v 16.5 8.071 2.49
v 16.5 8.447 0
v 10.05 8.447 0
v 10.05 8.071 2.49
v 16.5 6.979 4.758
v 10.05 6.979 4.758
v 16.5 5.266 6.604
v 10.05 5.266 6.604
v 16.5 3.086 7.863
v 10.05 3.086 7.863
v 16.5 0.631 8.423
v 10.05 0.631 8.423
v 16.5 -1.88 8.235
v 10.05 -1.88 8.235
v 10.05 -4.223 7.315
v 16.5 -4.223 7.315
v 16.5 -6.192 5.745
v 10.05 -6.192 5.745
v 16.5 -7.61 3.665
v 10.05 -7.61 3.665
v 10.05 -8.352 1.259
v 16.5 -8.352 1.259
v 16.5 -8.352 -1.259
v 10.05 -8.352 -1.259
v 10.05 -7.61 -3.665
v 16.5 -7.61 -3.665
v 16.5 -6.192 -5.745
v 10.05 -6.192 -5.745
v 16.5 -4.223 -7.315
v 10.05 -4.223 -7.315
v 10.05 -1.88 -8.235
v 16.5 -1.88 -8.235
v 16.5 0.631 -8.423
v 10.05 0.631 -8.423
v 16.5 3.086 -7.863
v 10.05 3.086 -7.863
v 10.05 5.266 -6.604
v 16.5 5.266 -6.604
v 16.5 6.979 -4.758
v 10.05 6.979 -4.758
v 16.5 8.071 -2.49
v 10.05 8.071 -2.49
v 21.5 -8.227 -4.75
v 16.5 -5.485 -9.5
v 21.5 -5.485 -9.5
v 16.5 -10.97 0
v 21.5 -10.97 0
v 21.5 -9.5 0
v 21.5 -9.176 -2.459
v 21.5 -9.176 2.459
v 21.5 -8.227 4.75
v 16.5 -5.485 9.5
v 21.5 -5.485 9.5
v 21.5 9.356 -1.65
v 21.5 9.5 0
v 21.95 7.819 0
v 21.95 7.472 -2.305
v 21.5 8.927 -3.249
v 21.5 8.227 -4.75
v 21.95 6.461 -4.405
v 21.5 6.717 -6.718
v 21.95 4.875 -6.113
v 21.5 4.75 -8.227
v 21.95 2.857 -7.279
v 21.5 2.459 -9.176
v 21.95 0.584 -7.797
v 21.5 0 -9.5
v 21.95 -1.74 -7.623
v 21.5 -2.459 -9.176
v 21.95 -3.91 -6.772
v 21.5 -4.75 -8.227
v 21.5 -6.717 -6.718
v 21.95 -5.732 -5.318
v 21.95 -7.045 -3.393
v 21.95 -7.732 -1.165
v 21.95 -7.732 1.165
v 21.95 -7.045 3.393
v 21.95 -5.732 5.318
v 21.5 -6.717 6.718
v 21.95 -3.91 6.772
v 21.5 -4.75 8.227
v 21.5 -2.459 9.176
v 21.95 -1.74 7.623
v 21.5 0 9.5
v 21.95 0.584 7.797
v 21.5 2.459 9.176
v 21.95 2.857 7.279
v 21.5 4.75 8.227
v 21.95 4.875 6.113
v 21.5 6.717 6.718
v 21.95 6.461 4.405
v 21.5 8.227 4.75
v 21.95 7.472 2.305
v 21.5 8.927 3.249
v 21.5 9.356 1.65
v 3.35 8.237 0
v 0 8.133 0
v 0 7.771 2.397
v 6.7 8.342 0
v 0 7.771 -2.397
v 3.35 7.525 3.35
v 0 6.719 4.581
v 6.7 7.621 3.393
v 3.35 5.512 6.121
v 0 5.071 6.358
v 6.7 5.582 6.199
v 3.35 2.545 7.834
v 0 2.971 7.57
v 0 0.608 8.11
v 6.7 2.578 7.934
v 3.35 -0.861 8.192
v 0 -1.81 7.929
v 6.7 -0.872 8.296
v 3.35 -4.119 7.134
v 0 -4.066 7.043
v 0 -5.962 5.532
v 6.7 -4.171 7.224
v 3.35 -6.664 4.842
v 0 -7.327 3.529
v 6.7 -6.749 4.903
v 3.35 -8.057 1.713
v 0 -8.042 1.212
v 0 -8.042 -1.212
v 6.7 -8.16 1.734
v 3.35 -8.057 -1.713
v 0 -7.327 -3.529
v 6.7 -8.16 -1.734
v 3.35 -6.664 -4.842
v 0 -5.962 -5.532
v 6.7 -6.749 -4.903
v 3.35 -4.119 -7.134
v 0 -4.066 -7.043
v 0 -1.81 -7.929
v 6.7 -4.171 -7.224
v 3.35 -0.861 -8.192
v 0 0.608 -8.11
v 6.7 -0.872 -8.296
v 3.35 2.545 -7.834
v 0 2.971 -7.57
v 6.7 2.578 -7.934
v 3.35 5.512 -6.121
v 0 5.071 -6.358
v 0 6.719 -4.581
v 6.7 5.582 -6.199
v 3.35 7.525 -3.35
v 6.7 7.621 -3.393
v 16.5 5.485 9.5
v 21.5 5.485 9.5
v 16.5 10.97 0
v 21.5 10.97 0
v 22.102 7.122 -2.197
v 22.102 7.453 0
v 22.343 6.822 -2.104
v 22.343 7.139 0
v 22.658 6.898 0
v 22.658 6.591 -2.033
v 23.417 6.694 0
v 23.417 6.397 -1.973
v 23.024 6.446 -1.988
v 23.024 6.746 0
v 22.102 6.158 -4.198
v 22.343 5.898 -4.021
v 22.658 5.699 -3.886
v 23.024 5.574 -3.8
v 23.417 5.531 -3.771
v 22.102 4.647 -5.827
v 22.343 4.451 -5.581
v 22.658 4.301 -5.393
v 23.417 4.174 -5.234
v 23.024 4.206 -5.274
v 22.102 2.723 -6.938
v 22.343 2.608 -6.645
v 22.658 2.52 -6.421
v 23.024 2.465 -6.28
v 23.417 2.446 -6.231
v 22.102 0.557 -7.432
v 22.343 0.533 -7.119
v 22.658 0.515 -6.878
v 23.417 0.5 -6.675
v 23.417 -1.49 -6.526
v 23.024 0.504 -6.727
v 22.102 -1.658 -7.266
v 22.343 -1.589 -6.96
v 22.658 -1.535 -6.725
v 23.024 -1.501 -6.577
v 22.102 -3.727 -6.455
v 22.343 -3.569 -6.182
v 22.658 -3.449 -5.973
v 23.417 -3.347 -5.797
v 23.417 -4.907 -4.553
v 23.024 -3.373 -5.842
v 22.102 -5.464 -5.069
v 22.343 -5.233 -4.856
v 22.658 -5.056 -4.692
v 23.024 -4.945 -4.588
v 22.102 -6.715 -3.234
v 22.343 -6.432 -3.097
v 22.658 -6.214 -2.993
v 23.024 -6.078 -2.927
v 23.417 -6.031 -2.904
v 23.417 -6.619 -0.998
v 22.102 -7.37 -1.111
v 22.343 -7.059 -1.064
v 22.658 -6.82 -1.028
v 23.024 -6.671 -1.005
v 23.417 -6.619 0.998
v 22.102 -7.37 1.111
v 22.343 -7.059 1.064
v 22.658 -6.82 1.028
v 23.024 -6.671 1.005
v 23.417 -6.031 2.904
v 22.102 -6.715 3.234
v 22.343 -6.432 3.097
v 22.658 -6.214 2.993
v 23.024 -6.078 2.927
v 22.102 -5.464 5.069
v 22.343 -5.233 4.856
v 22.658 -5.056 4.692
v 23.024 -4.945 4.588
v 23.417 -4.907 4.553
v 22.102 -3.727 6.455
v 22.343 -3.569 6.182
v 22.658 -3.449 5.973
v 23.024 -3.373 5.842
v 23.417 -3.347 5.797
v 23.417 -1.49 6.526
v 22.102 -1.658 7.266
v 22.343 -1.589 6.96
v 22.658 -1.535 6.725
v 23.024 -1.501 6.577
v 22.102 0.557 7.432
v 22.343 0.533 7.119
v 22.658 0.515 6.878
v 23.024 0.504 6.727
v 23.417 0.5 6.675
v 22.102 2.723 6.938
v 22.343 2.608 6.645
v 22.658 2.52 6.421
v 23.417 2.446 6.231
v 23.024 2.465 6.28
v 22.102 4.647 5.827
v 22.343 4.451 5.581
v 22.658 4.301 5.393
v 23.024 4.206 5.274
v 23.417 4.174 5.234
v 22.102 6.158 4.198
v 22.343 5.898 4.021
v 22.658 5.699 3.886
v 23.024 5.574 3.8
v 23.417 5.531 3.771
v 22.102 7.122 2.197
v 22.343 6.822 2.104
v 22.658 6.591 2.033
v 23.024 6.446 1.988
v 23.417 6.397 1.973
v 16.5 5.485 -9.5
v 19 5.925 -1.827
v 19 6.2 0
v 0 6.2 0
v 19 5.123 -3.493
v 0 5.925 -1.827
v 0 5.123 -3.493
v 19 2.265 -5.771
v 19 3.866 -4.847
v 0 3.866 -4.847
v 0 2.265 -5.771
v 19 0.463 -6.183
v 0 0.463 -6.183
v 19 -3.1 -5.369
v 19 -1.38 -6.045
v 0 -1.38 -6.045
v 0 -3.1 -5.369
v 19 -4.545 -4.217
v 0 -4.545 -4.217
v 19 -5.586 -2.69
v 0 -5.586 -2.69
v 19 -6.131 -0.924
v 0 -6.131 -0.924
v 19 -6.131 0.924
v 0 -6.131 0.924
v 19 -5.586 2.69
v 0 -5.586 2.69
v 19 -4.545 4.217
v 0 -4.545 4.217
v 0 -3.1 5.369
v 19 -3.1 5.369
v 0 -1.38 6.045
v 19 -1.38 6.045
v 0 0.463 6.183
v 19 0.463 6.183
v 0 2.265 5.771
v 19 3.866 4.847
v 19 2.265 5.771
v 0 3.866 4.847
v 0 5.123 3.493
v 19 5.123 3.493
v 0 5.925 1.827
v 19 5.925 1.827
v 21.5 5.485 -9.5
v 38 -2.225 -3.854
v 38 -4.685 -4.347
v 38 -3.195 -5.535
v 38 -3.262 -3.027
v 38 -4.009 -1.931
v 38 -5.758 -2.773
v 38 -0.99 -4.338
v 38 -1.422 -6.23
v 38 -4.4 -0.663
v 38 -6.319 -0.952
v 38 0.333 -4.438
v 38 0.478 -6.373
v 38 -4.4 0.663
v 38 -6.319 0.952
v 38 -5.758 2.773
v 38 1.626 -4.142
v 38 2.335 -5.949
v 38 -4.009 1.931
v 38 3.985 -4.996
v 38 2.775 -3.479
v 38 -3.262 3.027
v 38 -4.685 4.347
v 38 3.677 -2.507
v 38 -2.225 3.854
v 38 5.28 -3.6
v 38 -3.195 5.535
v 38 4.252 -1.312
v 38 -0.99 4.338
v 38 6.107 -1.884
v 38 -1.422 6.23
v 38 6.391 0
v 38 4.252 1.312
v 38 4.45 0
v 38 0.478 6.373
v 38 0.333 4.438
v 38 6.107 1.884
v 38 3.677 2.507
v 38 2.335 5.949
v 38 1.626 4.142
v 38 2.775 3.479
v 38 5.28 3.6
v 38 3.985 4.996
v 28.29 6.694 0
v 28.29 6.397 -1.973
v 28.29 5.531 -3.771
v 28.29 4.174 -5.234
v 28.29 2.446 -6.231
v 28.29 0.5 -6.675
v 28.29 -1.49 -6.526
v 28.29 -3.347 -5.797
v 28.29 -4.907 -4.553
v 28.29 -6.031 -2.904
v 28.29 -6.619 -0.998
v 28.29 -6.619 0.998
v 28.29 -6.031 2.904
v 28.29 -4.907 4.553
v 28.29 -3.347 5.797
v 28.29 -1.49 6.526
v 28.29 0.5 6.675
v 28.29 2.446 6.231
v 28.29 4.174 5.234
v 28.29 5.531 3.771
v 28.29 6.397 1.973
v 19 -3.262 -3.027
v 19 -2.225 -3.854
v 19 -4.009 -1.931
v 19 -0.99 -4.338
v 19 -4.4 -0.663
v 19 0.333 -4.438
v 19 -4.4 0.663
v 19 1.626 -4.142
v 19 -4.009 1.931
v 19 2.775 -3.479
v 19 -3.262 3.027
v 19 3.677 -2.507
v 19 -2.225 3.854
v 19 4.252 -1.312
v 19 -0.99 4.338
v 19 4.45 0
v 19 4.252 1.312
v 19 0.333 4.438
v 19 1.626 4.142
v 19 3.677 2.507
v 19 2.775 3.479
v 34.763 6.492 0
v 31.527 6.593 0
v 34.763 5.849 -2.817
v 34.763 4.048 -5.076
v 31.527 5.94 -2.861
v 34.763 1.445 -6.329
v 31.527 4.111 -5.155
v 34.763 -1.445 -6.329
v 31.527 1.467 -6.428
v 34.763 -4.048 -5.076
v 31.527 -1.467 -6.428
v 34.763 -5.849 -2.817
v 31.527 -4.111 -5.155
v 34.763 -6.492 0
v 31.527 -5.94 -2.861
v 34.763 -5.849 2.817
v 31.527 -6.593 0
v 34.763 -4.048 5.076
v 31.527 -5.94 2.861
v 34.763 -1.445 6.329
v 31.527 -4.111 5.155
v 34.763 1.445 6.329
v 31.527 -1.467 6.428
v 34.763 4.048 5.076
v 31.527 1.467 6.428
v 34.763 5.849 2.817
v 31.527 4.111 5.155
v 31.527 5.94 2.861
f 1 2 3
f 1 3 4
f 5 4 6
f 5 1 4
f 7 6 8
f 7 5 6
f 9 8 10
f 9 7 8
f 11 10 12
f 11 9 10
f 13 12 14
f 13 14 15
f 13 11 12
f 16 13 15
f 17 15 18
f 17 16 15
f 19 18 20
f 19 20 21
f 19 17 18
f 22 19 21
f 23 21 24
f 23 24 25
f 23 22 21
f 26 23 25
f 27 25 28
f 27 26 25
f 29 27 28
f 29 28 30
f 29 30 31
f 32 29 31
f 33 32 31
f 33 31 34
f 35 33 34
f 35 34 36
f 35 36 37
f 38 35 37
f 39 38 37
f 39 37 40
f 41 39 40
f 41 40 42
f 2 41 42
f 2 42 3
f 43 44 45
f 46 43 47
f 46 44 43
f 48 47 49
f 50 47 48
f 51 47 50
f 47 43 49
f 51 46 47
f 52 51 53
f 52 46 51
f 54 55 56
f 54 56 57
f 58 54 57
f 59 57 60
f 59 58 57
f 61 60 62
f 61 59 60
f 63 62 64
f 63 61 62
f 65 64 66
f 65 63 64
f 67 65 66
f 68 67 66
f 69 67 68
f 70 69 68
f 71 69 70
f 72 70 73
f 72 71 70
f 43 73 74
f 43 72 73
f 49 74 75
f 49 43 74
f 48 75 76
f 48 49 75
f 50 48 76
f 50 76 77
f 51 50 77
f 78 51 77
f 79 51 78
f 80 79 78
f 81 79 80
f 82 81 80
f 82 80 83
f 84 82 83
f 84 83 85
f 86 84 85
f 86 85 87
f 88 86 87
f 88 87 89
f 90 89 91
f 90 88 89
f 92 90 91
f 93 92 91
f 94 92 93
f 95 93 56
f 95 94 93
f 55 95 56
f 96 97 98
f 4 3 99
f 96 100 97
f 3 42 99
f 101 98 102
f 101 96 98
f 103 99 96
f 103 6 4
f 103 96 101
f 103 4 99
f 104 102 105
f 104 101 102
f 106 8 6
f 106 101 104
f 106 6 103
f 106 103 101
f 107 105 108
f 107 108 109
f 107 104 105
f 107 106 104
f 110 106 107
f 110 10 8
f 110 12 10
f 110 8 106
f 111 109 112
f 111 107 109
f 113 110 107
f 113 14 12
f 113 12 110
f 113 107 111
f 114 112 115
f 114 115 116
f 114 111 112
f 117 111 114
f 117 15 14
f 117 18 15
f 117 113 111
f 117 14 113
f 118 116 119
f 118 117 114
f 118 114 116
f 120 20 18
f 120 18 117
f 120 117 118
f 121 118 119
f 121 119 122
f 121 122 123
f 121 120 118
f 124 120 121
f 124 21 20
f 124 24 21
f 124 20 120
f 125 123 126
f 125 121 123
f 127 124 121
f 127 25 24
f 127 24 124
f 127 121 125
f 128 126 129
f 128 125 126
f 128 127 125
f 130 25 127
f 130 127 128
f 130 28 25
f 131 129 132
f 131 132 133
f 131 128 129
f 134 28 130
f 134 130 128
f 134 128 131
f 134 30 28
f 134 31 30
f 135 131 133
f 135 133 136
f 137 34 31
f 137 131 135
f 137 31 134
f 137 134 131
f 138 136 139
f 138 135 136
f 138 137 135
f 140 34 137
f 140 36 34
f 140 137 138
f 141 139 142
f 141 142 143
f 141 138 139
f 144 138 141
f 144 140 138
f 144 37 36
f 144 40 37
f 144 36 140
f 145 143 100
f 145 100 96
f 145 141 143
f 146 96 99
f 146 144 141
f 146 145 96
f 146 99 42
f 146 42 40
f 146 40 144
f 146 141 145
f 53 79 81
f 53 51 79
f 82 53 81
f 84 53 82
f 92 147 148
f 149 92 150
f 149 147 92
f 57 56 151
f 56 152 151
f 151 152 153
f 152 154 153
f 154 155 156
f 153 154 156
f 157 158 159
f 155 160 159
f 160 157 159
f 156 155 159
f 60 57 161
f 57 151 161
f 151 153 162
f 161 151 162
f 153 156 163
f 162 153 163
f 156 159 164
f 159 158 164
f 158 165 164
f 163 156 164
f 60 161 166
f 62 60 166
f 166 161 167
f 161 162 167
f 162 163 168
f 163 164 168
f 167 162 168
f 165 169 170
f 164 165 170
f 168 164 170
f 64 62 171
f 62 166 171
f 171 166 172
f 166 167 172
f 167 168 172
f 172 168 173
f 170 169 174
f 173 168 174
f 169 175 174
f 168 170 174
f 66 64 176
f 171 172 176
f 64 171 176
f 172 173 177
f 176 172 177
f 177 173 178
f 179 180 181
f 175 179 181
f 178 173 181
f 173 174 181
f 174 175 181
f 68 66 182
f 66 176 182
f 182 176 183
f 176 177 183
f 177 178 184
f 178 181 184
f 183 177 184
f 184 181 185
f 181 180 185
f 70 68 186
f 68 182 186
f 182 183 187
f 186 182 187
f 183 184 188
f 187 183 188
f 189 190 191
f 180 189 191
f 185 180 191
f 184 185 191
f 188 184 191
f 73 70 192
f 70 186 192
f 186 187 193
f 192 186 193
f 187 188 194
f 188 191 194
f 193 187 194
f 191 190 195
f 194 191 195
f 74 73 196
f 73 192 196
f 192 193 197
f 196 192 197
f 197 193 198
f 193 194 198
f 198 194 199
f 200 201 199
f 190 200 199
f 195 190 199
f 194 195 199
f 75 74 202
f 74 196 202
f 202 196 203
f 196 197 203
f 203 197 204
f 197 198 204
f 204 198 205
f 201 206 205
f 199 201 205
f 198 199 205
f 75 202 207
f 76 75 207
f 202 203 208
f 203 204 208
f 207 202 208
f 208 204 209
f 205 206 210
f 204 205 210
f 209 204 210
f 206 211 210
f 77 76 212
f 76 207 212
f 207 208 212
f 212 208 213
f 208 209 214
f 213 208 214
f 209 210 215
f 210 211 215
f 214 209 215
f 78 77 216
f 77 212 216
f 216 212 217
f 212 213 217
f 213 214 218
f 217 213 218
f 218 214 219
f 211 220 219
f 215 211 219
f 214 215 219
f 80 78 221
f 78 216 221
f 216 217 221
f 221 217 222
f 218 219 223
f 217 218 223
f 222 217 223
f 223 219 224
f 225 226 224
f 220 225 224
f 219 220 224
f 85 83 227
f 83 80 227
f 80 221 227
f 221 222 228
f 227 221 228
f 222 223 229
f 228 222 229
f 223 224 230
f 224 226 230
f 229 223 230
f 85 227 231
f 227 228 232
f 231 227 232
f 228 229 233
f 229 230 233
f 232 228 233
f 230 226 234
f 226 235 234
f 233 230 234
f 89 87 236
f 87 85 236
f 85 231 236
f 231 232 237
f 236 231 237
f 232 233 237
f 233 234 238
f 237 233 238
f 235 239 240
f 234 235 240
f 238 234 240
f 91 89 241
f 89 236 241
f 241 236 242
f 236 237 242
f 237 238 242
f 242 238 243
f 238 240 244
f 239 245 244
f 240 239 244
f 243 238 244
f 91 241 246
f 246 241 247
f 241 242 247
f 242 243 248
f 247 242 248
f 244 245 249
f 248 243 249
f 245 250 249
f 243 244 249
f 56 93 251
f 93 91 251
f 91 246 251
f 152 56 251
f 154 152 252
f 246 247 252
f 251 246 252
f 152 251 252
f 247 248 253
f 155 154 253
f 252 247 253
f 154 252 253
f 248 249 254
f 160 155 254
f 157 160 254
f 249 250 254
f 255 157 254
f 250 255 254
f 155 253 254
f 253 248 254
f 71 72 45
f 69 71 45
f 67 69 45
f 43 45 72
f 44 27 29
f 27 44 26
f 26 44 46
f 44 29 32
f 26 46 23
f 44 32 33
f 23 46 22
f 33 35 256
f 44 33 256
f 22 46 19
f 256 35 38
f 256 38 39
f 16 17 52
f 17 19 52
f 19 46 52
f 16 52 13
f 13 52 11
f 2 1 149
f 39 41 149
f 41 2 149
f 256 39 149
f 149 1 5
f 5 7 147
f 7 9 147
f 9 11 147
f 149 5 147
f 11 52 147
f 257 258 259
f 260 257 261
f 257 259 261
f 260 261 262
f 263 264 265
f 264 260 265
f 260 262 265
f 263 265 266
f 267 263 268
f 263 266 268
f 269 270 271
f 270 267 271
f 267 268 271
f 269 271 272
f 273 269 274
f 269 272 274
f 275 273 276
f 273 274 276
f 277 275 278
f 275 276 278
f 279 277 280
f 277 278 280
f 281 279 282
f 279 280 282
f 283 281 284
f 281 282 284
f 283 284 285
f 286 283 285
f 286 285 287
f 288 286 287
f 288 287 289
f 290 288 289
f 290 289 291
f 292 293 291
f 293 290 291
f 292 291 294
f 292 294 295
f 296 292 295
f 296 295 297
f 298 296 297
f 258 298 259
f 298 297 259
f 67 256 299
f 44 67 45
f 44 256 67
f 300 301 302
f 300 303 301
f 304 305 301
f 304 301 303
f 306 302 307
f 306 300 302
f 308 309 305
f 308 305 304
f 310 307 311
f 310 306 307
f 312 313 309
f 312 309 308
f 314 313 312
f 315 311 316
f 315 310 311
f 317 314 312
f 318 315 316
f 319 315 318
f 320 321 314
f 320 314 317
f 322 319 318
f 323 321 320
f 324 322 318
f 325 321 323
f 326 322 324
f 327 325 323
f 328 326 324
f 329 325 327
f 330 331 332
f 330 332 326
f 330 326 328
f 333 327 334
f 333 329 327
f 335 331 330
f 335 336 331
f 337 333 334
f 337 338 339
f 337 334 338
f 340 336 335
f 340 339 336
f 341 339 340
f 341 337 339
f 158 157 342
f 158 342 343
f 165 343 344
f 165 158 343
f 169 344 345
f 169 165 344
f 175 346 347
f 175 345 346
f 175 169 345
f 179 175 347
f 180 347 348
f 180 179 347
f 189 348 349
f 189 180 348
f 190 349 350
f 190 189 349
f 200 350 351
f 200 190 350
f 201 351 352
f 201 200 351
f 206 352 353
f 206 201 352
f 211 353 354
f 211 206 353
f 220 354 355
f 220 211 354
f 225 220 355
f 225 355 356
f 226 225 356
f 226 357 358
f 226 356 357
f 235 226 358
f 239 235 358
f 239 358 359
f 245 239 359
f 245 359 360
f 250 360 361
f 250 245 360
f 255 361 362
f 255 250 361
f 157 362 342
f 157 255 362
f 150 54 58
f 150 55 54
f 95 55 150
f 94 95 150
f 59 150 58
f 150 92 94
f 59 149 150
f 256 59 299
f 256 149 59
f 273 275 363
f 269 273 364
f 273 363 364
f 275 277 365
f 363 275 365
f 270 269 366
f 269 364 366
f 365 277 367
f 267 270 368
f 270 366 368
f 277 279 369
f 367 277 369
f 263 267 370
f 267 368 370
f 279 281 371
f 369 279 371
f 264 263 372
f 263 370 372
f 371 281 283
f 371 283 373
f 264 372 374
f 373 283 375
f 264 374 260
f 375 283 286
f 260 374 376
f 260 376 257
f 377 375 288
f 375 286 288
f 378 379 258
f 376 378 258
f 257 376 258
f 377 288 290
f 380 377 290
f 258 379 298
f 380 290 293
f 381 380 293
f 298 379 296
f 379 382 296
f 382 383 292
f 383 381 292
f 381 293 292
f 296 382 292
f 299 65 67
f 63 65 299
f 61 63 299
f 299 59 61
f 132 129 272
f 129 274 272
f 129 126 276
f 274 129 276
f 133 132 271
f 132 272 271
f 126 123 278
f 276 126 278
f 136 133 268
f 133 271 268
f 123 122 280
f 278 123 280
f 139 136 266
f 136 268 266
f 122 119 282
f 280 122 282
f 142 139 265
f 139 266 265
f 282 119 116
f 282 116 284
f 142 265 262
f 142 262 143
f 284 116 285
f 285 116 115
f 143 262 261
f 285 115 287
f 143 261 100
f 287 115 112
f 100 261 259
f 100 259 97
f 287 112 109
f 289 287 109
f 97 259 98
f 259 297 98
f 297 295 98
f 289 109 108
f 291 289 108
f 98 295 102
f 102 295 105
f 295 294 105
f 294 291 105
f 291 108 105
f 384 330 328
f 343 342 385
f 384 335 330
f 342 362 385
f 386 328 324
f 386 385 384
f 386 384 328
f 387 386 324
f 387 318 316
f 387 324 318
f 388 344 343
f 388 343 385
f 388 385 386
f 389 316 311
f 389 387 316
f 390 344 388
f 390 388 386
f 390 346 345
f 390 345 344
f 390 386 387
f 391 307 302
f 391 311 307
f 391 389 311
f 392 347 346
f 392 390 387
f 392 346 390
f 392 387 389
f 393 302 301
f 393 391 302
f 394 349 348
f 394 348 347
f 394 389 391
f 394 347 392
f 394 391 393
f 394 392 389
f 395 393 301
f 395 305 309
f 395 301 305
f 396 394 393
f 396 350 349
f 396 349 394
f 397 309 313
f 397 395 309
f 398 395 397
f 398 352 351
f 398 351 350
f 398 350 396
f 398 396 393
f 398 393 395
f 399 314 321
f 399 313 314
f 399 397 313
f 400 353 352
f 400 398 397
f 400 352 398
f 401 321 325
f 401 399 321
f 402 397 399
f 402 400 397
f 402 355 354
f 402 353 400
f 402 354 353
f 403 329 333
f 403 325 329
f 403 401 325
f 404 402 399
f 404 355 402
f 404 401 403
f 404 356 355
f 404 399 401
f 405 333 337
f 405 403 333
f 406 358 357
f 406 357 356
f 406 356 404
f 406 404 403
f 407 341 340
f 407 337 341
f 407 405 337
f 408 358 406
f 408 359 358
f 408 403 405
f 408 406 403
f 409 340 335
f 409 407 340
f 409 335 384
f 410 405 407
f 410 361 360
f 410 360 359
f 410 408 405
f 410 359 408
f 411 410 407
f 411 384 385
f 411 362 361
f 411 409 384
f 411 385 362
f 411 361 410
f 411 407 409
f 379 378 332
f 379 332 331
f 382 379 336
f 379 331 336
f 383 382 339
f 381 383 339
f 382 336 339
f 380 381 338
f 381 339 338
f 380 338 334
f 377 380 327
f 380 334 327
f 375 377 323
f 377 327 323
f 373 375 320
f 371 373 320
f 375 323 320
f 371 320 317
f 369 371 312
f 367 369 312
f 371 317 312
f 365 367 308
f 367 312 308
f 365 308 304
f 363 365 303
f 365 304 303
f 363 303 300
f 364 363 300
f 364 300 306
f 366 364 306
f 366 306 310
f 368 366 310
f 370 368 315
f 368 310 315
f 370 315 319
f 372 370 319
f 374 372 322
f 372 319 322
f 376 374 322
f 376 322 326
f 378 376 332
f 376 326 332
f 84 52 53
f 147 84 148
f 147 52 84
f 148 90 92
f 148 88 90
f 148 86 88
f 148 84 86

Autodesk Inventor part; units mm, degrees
ref_plane "YZ Plane" through (0, 0, 0) normal (1, 0, 0) x (0, 1, 0)
ref_plane "XZ Plane" through (0, 0, 0) normal (0, 1, 0) x (-1, 0, 0)
sketch "Sketch1" plane through (0, 0, 0) normal (0, 0, 1) x (1, 0, 0)
  line L0 (0, 0) -> (38, 0)
  line L1 (0, 0) -> (0, 6.2) construction
  line L2 (19, 4.45) -> (19, 6.2)
  line L3 (38, 4.45) -> (38, 0) construction
  line L4 (0, 6.2) -> (0, 8.1326)
  line L5 (38, 4.45) -> (38, 6.3907)
  line L6 (28.29, 6.6941) -> (28.29, 0) construction
  line L7 (16.5, 9.5) -> (21.5, 9.5)
  line L8 (19, 6.2) -> (19, 9.5) construction
  line L9 (19, 6.2) -> (0, 6.2)
  line L10 (19, 4.45) -> (38, 4.45)
  line L11 (0, 8.1326) -> (10.05, 8.4466)
  line L12 (10.05, 8.4466) -> (10.05, 0) construction
  line L13 (10.05, 8.4466) -> (16.5, 8.4466)
  line L14 (16.5, 8.4466) -> (16.5, 9.5)
  line L15 (38, 6.3907) -> (28.29, 6.6941)
  line L16 (21.5, 6.6941) -> (21.5, 9.5) construction
  line L17 (19, 4.45) -> (19, 0) construction
  line L18 (21.5, 9.5) -> (21.9504, 7.8192)
  line L19 (28.29, 6.6941) -> (23.4166, 6.6941)
  line L20 (21.5, 6.6941) -> (23.4166, 6.6941) construction
  arc A0 (21.9504, 7.8192) -> (23.4166, 6.6941) centre (23.4166, 8.2121) ccw
  line L21 (6.35, 8.331) -> (6.35, 0) construction
  line L22 (31.99, 6.5785) -> (31.99, 0) construction
  dimension "d0" = 38
  dimension "d3" = 19
  dimension "d4" = 19
  dimension "d5" = 8.9
  dimension "d7" = 1.79
  dimension "d8" = 12.4
  dimension "d10" = 1.79
  dimension "d11" = 10.05
  dimension "d12" = 5
  dimension "d13" = 9.71
  dimension "d18" = 15
  dimension "d23" = 1.518
  dimension "d27" = 6.35
  dimension "d28" = 6.01
  dimension "d29" = 16.662
  dimension "d30" = 13.157
revolve "Revolve1" add sketch "Sketch1" angle 360 about axis through (0, 0, 0) along (1, 0, 0)
ref_plane "Work Plane1" through (19, 0, 0) normal (1, 0, 0) x (0, 1, 0)
sketch "Sketch2" plane through (19, 0, 0) normal (1, 0, 0) x (0, 1, 0)
  circle A0 centre (0, 0) radius 9.5 projected
  line L0 (-5.4848, -9.5) -> (-10.9697, 0)
  line L1 (-10.9697, 0) -> (-5.4848, 9.5)
  line L2 (-5.4848, 9.5) -> (5.4848, 9.5)
  line L3 (5.4848, 9.5) -> (10.9697, 0)
  line L4 (10.9697, 0) -> (5.4848, -9.5)
  line L5 (5.4848, -9.5) -> (-5.4848, -9.5)
  point P0 (0, 0)
  point P1 (0, 0)
  point P2 (0, -9.5)
extrude "Extrude1" add sketch "Sketch2" along normal mid plane 5 contours A0 L3 L4 | A0 L2 L3 | L4 L5 A0 | A0 L1 L2 | L5 L0 A0 | A0 L0 L1
thread "Gwint1" size "R 3/8" standard "ISO Taper" full length
thread "Gwint2" size "R 1/4" standard "ISO Taper" full length
equation "\"d0\" = a"
equation "\"d3\" = 0.5 * a"
equation "\"d4\" = S"
equation "\"d5\" = d2"
equation "\"d8\" = d1"
equation "\"d11\" = L1"
equation "\"d12\" = M"
equation "\"d13\" = L2"
equation "\"d23\" = 0.11 * OD2"
equation "\"d27\" = a1"
equation "\"d28\" = a2"
equation "\"d29\" = DD1"
equation "\"d30\" = DD2"
equation "\"d16\" = M"
equation "\"OD1\" = 17.3"
equation "\"OD2\" = 13.8"
equation "\"a\" = 38"
equation "\"d1\" = 12.4"
equation "\"d2\" = 8.9"
equation "\"M\" = 5"
equation "\"S\" = 19"
equation "\"L1\" = 10.05"
equation "\"L2\" = 9.71"
equation "\"d14\" = 0.5 * a"
equation "\"a1\" = 6.35"
equation "\"DD1\" = 16.662"
equation "\"a2\" = 6.01"
equation "\"DD2\" = 13.157"
equation "\"Size_Designation\" = 1.2345"
properties part number "ISO 49 Złączka wkrętna sześciokątna, redukcyjna N8 3/8 x 1/4" material "Żelazo, ciągliwe"
